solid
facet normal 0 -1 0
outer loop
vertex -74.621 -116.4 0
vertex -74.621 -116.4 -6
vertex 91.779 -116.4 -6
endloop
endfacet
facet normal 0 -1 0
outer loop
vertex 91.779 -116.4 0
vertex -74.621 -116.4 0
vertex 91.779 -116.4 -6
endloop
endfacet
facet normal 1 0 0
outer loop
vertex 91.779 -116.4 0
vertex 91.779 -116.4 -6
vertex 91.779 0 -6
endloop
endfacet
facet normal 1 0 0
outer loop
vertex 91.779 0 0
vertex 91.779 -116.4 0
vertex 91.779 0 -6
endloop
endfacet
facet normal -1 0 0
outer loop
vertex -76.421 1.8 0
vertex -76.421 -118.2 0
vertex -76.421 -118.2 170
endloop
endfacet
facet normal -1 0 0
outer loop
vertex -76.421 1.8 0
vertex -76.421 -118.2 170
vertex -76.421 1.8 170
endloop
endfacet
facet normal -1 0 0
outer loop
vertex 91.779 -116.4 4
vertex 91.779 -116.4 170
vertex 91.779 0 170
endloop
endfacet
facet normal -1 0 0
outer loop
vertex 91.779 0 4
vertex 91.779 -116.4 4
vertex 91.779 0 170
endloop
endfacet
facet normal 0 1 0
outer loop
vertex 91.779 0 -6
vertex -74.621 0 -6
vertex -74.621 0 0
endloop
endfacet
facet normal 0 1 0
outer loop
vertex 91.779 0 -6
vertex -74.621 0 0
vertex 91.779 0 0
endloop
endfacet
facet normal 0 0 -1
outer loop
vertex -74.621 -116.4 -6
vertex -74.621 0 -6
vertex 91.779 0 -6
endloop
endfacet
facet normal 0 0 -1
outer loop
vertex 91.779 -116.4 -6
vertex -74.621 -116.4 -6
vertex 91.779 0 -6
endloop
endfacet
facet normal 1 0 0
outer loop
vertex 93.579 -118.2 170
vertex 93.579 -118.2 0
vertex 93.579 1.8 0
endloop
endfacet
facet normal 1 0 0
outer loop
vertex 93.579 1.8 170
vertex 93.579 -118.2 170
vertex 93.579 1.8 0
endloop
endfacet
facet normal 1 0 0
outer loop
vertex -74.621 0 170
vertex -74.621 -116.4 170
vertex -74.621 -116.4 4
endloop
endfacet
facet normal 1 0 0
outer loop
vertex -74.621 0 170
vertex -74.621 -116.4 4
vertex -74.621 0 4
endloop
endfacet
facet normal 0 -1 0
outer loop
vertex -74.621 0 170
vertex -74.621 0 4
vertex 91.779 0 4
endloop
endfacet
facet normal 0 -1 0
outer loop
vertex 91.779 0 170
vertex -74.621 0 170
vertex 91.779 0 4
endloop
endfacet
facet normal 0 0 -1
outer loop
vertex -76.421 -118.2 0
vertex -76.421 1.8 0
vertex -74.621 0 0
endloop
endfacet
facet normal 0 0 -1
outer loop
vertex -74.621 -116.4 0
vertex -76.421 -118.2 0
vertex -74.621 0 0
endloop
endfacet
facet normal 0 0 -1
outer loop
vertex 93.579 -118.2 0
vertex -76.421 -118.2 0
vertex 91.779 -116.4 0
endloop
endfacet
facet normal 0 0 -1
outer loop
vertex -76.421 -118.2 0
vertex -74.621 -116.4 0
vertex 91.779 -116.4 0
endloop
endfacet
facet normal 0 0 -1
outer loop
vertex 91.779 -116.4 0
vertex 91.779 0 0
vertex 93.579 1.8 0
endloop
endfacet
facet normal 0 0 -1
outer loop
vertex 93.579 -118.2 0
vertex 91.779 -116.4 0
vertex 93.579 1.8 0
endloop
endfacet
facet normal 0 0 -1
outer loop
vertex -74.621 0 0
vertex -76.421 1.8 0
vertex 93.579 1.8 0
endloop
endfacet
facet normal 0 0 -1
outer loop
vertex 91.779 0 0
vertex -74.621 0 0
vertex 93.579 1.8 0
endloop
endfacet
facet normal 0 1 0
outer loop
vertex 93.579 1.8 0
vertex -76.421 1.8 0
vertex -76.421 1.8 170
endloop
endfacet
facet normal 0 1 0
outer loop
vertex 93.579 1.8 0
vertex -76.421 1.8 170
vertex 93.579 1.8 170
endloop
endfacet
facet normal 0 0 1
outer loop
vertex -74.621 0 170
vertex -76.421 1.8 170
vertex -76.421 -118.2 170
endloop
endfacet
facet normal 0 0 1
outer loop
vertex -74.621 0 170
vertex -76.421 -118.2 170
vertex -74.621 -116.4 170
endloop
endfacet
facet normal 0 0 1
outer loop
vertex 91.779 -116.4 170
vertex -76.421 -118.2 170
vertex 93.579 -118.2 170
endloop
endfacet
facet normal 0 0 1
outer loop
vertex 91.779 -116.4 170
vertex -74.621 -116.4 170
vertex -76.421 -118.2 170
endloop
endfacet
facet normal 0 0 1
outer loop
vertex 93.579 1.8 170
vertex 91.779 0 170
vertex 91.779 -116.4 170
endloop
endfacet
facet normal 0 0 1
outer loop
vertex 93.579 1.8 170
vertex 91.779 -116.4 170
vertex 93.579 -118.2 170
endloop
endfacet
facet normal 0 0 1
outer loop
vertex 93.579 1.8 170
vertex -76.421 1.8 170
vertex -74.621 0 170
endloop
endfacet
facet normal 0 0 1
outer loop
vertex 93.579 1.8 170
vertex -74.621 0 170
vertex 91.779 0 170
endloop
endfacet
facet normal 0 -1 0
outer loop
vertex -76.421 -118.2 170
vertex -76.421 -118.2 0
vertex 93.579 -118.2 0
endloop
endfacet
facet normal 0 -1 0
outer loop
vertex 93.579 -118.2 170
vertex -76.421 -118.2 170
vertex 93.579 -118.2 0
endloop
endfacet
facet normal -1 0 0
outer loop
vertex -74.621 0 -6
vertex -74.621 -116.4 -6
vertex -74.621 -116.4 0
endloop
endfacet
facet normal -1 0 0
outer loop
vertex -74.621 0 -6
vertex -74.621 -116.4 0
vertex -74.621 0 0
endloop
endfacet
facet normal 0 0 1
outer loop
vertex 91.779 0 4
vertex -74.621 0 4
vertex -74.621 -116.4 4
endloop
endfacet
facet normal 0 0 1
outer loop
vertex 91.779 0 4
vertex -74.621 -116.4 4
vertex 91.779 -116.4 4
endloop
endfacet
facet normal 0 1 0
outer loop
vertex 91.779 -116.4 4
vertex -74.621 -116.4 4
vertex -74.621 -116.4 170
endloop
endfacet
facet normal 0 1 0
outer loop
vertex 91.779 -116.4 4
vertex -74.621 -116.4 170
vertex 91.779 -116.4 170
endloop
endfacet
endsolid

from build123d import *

# Parameters (mm, degrees)
F0_W     = 166.4
F0_H     = 116.4
F1_DEPTH = 170
F0_W_2   = 170
F0_H_2   = 120
F2_DEPTH = 170
F4_DEPTH = 1
F5_DEPTH = 5
F6_DEPTH = 170


with BuildPart() as f1:
    # F0 (on Top) → F1 (new body)
    with BuildSketch(Plane.XY):
        with Locations((6.7789069265, 121.5492137671)):
            Rectangle(F0_W, F0_H)
    extrude(amount=F1_DEPTH)


with BuildPart() as f2:
    # F0 (on Top) → F2 (new body)
    with BuildSketch(Plane.XY):
        with Locations((6.7789069265, 121.5492137671)):
            Rectangle(F0_W_2, F0_H_2)
        with Locations((6.7789069265, 121.5492137671)):
            Rectangle(F0_W, F0_H, mode=Mode.SUBTRACT)
    extrude(amount=F2_DEPTH)

    # F3: cut F1
    add(f1.part, mode=Mode.SUBTRACT)


with BuildPart() as f4:
    # F0 (on Top) → F4 (new body, symmetric)
    with BuildSketch(Plane.XY):
        with Locations((8.5789069265, -58.2)):
            Rectangle(F0_W, F0_H)
    extrude(amount=F4_DEPTH, both=True)


with BuildPart() as f5:
    # F5 (new, symmetric): a face of the model
    f5_faces = [f4.part.faces().sort_by_distance(p)[0] for p in [
        (8.5789069265, -58.2, -1),
    ]]
    extrude(f5_faces, amount=F5_DEPTH, both=True)


with BuildPart() as f4_1:
    add(f4.part)

    add(f5.part)  # F6 merges F5
    # F0 (on Top) → F6 (join)
    with BuildSketch(Plane.XY):
        with Locations((8.5789069265, -58.2)):
            Rectangle(F0_W_2, F0_H_2)
        with Locations((8.5789069265, -58.2)):
            Rectangle(F0_W, F0_H, mode=Mode.SUBTRACT)
    extrude(amount=F6_DEPTH)


solid = f4_1.part
